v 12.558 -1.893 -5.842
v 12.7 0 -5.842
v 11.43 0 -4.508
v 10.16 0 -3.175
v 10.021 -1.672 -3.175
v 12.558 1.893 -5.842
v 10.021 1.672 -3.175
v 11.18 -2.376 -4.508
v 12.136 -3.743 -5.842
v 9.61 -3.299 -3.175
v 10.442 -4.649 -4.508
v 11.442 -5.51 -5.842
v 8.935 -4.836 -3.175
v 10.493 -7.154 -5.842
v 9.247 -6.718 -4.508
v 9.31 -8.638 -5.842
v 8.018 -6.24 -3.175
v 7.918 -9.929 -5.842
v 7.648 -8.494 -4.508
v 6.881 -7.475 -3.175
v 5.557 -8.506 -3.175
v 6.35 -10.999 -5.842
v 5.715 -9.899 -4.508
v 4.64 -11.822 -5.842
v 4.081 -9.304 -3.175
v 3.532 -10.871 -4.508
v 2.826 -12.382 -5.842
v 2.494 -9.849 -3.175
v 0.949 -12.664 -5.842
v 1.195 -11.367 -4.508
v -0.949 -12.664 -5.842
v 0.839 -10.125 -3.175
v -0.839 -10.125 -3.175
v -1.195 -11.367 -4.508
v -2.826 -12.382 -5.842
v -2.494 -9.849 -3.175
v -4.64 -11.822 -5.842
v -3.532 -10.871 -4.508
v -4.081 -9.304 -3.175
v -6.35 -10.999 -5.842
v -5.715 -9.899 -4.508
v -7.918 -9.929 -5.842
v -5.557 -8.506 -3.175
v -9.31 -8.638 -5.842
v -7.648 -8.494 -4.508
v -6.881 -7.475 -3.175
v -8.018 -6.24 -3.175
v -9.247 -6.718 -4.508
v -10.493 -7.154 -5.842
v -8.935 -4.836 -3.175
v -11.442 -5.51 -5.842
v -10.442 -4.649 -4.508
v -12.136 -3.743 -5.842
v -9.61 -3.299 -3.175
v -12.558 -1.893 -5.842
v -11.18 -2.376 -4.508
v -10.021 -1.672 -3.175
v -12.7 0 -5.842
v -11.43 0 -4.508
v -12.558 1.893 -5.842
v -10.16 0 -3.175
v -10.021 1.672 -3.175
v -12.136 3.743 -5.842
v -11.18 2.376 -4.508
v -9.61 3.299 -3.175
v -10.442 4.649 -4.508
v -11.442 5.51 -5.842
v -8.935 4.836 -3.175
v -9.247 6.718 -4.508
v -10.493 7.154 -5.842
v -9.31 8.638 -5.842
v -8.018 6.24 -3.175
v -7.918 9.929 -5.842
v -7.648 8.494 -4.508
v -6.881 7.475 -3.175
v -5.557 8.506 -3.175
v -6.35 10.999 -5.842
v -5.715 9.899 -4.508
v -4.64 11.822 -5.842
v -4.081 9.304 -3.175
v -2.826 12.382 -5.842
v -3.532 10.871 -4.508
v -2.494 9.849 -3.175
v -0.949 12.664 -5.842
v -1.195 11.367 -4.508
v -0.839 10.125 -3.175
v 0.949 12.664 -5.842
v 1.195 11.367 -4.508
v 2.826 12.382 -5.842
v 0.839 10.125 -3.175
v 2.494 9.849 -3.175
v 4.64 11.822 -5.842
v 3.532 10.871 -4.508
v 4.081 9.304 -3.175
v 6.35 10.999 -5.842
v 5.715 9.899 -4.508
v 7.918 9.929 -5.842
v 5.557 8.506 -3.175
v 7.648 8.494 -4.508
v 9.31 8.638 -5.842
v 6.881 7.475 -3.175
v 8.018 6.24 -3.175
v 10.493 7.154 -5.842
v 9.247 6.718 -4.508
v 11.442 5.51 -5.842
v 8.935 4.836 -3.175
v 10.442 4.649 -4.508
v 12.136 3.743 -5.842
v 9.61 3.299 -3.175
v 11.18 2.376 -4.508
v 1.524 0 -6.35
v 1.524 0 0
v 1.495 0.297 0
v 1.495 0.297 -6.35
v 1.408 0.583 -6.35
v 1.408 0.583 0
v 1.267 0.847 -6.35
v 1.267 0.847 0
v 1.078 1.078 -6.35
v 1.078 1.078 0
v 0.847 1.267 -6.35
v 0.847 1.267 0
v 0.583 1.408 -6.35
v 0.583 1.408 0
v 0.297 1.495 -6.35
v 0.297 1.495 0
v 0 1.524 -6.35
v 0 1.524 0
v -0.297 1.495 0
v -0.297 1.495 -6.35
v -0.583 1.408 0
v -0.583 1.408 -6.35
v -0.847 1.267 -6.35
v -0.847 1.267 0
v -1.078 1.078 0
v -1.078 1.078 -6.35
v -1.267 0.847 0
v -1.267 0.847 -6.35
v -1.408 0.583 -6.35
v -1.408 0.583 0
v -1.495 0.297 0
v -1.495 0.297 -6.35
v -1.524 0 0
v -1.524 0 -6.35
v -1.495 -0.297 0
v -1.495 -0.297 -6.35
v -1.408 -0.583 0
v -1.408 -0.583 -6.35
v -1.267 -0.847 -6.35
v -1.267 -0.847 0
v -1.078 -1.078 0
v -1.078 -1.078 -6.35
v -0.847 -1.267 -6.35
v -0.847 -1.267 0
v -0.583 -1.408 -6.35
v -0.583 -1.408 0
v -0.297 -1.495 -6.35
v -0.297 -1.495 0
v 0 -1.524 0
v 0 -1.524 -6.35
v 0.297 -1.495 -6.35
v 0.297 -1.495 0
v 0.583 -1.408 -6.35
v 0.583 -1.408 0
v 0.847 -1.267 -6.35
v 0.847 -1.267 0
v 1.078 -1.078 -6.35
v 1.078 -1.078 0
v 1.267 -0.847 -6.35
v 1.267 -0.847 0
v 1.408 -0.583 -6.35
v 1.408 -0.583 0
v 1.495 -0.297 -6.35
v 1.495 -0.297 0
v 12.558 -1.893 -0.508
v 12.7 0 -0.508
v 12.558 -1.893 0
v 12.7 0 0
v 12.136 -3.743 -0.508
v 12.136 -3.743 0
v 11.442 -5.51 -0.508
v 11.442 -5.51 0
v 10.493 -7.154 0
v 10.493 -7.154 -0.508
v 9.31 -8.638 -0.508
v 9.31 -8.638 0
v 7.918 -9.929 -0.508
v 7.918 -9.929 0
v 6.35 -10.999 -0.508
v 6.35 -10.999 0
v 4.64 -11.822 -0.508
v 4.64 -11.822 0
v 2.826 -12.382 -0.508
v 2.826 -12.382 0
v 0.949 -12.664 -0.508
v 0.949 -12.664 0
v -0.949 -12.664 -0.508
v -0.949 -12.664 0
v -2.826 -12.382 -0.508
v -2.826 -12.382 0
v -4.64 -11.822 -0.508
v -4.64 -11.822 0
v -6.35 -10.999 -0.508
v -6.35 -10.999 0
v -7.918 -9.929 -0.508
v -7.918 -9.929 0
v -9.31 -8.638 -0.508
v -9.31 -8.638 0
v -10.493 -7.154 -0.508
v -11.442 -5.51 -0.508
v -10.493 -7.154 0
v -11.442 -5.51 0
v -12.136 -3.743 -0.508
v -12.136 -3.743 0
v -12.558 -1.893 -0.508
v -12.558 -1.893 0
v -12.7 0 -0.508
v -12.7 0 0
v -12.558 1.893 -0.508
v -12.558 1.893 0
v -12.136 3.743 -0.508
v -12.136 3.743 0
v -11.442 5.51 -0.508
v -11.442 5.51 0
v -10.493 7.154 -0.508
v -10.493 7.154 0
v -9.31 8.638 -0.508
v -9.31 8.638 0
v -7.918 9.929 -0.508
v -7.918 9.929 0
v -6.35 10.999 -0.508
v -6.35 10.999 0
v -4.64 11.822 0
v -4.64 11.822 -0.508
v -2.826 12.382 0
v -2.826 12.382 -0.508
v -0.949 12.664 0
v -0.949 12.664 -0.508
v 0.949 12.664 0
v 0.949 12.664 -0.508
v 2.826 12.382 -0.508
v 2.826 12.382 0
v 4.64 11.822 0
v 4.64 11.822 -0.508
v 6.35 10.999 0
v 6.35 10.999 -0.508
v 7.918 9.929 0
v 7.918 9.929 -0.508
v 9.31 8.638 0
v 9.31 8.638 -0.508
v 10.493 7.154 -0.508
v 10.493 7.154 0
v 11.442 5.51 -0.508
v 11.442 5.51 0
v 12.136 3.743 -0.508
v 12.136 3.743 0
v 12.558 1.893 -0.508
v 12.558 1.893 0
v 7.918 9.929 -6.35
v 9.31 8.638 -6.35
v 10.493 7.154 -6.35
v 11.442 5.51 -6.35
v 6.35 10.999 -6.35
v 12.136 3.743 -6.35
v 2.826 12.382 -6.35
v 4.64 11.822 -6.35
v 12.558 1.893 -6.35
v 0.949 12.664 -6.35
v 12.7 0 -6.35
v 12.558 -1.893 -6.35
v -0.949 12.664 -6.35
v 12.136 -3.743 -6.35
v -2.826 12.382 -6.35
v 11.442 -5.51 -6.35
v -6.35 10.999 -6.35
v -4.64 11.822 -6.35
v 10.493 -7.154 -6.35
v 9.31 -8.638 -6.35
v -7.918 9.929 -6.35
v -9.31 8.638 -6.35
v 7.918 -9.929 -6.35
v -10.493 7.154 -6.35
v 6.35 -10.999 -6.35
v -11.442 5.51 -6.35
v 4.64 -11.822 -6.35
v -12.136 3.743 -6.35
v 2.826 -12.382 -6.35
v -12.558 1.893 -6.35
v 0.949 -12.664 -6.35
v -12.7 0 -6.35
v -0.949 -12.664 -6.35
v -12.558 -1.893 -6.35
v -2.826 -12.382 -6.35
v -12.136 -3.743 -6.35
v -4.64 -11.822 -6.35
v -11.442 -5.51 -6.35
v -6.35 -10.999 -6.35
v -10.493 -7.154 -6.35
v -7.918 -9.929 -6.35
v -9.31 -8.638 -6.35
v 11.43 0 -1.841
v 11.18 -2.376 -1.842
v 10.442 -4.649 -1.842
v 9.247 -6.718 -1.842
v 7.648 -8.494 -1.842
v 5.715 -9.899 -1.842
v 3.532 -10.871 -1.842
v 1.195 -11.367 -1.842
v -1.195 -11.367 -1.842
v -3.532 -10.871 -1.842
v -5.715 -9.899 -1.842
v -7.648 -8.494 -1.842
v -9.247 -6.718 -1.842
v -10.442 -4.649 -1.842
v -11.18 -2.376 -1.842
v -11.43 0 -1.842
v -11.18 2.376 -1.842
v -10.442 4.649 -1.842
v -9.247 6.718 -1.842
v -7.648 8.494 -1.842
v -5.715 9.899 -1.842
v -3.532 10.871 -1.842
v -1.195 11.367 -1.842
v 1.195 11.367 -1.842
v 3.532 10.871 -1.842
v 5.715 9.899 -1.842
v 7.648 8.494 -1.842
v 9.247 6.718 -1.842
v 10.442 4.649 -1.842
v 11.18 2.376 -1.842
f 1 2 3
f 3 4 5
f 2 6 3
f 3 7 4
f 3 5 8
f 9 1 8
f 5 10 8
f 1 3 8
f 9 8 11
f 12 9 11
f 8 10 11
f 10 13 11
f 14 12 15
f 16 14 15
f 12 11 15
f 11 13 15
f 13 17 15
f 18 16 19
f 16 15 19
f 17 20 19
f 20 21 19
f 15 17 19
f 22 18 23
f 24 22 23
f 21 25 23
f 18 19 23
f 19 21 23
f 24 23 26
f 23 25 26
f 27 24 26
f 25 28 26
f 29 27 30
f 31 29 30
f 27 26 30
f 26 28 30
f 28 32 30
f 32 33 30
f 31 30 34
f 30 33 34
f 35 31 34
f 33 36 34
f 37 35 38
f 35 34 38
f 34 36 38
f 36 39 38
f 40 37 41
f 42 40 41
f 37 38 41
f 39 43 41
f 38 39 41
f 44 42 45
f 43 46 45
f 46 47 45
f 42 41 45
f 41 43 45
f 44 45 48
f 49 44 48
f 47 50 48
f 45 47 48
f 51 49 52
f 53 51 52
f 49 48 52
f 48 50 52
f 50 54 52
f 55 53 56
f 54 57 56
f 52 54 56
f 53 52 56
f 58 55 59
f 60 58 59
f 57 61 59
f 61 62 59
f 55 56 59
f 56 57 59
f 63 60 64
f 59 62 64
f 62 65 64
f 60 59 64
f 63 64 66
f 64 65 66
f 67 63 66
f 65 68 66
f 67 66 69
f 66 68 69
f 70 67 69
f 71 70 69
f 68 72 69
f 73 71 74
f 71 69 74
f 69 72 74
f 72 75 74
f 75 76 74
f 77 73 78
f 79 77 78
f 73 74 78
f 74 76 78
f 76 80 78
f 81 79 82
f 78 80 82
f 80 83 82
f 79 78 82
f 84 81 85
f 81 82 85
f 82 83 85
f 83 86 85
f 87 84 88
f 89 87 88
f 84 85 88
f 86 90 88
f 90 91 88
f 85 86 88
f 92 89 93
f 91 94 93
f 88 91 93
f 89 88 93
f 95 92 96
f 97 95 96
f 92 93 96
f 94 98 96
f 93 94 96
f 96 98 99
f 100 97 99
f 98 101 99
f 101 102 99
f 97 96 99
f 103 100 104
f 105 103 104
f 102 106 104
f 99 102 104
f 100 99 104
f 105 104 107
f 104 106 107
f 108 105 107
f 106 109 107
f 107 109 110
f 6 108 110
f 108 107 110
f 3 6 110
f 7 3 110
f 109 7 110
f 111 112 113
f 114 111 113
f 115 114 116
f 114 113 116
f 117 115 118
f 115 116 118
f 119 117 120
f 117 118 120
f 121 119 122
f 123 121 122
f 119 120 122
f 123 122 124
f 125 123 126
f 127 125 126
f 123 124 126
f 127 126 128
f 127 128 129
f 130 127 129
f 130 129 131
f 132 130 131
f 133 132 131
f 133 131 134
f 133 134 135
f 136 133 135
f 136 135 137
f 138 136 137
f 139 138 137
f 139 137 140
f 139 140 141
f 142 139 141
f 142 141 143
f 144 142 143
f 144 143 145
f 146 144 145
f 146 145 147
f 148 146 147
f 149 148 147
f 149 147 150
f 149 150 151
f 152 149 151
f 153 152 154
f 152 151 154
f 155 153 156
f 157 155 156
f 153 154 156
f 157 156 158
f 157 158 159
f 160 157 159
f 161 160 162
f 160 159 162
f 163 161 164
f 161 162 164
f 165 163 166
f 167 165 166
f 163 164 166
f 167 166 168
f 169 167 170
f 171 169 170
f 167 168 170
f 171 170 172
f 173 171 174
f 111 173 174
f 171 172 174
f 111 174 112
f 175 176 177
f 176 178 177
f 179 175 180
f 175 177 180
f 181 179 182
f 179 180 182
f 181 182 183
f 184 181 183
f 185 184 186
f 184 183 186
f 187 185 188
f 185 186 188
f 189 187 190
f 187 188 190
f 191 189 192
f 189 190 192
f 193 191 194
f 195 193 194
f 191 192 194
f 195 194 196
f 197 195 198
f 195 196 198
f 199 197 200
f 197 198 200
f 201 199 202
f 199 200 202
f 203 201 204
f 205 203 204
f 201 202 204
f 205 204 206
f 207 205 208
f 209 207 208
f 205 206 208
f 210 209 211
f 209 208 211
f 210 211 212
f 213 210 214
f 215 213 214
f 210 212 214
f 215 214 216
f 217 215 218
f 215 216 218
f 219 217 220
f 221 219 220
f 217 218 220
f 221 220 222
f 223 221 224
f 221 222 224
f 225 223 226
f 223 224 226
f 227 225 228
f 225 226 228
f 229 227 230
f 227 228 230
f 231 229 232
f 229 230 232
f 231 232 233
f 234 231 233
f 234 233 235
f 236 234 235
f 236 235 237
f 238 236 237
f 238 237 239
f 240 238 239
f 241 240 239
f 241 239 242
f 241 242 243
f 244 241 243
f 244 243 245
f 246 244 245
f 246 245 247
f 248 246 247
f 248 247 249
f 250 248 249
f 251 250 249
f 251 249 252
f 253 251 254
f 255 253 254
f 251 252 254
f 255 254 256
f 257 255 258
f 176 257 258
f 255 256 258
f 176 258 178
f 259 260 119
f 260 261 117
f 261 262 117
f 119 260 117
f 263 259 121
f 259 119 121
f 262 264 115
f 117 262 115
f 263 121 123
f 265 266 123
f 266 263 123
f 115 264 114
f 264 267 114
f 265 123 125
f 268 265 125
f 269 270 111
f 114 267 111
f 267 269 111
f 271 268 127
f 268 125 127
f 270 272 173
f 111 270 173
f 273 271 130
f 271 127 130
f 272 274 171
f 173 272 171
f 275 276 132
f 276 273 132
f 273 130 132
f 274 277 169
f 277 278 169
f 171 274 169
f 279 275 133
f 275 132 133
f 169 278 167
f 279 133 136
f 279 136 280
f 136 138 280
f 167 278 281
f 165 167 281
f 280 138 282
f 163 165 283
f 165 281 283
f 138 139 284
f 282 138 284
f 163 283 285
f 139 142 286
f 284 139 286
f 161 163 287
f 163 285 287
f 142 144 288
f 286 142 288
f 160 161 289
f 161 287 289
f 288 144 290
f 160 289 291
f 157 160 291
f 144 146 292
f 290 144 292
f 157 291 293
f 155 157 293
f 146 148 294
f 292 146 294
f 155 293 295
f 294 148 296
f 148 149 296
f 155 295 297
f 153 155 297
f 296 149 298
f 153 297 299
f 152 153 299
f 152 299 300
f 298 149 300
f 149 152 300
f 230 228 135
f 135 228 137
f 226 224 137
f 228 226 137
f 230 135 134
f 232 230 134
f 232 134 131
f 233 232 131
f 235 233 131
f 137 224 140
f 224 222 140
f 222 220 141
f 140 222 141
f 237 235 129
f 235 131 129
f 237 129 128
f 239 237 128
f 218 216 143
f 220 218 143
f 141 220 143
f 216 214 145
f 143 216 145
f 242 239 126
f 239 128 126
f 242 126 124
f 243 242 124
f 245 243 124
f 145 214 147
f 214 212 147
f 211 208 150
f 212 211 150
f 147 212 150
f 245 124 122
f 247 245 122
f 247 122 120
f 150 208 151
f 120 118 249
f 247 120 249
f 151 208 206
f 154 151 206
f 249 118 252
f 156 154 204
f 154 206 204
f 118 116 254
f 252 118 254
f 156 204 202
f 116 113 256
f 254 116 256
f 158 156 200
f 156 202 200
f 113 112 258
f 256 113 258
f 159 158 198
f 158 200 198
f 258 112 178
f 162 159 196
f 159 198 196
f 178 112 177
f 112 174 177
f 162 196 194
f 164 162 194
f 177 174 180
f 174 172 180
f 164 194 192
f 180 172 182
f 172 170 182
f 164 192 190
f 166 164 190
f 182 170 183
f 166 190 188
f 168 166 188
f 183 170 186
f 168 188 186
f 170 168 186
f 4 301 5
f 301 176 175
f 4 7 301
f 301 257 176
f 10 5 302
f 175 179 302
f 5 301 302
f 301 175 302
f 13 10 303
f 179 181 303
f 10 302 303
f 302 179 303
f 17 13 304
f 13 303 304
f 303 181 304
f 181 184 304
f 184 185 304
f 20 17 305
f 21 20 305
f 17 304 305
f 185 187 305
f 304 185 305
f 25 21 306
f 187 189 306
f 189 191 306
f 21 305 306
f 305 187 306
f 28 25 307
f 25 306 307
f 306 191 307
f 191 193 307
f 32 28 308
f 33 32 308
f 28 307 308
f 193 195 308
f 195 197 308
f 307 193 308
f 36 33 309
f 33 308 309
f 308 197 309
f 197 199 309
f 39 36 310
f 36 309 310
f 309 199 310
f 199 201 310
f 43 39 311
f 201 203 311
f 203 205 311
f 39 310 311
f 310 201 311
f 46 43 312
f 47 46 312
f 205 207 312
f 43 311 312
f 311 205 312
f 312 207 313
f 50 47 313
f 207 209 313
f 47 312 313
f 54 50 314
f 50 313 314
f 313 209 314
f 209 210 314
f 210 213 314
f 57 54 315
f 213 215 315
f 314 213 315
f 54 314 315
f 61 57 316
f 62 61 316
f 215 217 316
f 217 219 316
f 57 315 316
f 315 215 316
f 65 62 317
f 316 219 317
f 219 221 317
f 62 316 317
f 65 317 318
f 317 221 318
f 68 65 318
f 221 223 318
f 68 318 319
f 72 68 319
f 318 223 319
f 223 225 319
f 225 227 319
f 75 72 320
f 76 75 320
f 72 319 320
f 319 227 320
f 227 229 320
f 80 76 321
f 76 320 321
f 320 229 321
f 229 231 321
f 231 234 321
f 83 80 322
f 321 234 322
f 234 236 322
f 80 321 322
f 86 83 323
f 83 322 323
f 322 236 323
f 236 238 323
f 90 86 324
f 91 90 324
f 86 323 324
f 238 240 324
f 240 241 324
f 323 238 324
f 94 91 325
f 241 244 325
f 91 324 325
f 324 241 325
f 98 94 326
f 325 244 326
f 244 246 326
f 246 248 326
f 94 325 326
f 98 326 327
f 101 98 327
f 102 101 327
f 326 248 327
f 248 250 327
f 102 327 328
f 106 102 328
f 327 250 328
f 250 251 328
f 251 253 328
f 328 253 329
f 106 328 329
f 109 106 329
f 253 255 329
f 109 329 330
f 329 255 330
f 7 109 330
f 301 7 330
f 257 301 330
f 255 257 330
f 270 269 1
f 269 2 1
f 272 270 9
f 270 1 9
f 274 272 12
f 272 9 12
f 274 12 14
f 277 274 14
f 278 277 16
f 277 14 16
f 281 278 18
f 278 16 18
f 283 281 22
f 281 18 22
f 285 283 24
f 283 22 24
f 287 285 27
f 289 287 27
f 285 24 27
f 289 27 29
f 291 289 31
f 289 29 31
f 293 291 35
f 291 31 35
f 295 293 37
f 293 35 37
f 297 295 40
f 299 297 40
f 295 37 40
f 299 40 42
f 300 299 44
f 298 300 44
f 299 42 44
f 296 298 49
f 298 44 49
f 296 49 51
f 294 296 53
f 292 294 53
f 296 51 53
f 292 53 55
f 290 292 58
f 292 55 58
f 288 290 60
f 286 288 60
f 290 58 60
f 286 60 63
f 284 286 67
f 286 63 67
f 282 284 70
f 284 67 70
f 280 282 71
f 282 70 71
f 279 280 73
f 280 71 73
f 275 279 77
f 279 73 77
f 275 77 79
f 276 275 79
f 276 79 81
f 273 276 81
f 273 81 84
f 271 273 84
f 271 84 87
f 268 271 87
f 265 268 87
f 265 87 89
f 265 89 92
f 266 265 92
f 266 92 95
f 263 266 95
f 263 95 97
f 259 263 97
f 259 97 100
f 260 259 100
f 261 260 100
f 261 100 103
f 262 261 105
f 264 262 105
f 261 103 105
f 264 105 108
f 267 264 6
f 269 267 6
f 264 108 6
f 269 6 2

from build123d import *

# Parameters (mm, degrees)
SKETCH3_R          = 1.524
CUT_EXTRUDE1_DEPTH = 20.05


with BuildPart() as part:
    # Sketch1 → Revolve1 (revolve)
    with BuildSketch(Plane(origin=(0, 0, 0), x_dir=(0, 0, -1), z_dir=(1, 0, 0)), mode=Mode.PRIVATE) as revolve1_sk:
        Polygon((0, 0), (6.35, 0), (6.35, 12.7), (5.842, 12.7), (3.175, 10.16), (0.508, 12.7), (0, 12.7), align=None)
    revolve(revolve1_sk.sketch.rotate(Axis((0, 0, 0), (0, 0, -1)), 90), axis=Axis((0, 0, 0), (0, 0, -1)))

    # Sketch3 → Cut-Extrude1 (cut, through all)
    with BuildSketch(Plane.XY):
        Circle(SKETCH3_R)
    extrude(amount=-CUT_EXTRUDE1_DEPTH, mode=Mode.SUBTRACT)


solid = part.part
